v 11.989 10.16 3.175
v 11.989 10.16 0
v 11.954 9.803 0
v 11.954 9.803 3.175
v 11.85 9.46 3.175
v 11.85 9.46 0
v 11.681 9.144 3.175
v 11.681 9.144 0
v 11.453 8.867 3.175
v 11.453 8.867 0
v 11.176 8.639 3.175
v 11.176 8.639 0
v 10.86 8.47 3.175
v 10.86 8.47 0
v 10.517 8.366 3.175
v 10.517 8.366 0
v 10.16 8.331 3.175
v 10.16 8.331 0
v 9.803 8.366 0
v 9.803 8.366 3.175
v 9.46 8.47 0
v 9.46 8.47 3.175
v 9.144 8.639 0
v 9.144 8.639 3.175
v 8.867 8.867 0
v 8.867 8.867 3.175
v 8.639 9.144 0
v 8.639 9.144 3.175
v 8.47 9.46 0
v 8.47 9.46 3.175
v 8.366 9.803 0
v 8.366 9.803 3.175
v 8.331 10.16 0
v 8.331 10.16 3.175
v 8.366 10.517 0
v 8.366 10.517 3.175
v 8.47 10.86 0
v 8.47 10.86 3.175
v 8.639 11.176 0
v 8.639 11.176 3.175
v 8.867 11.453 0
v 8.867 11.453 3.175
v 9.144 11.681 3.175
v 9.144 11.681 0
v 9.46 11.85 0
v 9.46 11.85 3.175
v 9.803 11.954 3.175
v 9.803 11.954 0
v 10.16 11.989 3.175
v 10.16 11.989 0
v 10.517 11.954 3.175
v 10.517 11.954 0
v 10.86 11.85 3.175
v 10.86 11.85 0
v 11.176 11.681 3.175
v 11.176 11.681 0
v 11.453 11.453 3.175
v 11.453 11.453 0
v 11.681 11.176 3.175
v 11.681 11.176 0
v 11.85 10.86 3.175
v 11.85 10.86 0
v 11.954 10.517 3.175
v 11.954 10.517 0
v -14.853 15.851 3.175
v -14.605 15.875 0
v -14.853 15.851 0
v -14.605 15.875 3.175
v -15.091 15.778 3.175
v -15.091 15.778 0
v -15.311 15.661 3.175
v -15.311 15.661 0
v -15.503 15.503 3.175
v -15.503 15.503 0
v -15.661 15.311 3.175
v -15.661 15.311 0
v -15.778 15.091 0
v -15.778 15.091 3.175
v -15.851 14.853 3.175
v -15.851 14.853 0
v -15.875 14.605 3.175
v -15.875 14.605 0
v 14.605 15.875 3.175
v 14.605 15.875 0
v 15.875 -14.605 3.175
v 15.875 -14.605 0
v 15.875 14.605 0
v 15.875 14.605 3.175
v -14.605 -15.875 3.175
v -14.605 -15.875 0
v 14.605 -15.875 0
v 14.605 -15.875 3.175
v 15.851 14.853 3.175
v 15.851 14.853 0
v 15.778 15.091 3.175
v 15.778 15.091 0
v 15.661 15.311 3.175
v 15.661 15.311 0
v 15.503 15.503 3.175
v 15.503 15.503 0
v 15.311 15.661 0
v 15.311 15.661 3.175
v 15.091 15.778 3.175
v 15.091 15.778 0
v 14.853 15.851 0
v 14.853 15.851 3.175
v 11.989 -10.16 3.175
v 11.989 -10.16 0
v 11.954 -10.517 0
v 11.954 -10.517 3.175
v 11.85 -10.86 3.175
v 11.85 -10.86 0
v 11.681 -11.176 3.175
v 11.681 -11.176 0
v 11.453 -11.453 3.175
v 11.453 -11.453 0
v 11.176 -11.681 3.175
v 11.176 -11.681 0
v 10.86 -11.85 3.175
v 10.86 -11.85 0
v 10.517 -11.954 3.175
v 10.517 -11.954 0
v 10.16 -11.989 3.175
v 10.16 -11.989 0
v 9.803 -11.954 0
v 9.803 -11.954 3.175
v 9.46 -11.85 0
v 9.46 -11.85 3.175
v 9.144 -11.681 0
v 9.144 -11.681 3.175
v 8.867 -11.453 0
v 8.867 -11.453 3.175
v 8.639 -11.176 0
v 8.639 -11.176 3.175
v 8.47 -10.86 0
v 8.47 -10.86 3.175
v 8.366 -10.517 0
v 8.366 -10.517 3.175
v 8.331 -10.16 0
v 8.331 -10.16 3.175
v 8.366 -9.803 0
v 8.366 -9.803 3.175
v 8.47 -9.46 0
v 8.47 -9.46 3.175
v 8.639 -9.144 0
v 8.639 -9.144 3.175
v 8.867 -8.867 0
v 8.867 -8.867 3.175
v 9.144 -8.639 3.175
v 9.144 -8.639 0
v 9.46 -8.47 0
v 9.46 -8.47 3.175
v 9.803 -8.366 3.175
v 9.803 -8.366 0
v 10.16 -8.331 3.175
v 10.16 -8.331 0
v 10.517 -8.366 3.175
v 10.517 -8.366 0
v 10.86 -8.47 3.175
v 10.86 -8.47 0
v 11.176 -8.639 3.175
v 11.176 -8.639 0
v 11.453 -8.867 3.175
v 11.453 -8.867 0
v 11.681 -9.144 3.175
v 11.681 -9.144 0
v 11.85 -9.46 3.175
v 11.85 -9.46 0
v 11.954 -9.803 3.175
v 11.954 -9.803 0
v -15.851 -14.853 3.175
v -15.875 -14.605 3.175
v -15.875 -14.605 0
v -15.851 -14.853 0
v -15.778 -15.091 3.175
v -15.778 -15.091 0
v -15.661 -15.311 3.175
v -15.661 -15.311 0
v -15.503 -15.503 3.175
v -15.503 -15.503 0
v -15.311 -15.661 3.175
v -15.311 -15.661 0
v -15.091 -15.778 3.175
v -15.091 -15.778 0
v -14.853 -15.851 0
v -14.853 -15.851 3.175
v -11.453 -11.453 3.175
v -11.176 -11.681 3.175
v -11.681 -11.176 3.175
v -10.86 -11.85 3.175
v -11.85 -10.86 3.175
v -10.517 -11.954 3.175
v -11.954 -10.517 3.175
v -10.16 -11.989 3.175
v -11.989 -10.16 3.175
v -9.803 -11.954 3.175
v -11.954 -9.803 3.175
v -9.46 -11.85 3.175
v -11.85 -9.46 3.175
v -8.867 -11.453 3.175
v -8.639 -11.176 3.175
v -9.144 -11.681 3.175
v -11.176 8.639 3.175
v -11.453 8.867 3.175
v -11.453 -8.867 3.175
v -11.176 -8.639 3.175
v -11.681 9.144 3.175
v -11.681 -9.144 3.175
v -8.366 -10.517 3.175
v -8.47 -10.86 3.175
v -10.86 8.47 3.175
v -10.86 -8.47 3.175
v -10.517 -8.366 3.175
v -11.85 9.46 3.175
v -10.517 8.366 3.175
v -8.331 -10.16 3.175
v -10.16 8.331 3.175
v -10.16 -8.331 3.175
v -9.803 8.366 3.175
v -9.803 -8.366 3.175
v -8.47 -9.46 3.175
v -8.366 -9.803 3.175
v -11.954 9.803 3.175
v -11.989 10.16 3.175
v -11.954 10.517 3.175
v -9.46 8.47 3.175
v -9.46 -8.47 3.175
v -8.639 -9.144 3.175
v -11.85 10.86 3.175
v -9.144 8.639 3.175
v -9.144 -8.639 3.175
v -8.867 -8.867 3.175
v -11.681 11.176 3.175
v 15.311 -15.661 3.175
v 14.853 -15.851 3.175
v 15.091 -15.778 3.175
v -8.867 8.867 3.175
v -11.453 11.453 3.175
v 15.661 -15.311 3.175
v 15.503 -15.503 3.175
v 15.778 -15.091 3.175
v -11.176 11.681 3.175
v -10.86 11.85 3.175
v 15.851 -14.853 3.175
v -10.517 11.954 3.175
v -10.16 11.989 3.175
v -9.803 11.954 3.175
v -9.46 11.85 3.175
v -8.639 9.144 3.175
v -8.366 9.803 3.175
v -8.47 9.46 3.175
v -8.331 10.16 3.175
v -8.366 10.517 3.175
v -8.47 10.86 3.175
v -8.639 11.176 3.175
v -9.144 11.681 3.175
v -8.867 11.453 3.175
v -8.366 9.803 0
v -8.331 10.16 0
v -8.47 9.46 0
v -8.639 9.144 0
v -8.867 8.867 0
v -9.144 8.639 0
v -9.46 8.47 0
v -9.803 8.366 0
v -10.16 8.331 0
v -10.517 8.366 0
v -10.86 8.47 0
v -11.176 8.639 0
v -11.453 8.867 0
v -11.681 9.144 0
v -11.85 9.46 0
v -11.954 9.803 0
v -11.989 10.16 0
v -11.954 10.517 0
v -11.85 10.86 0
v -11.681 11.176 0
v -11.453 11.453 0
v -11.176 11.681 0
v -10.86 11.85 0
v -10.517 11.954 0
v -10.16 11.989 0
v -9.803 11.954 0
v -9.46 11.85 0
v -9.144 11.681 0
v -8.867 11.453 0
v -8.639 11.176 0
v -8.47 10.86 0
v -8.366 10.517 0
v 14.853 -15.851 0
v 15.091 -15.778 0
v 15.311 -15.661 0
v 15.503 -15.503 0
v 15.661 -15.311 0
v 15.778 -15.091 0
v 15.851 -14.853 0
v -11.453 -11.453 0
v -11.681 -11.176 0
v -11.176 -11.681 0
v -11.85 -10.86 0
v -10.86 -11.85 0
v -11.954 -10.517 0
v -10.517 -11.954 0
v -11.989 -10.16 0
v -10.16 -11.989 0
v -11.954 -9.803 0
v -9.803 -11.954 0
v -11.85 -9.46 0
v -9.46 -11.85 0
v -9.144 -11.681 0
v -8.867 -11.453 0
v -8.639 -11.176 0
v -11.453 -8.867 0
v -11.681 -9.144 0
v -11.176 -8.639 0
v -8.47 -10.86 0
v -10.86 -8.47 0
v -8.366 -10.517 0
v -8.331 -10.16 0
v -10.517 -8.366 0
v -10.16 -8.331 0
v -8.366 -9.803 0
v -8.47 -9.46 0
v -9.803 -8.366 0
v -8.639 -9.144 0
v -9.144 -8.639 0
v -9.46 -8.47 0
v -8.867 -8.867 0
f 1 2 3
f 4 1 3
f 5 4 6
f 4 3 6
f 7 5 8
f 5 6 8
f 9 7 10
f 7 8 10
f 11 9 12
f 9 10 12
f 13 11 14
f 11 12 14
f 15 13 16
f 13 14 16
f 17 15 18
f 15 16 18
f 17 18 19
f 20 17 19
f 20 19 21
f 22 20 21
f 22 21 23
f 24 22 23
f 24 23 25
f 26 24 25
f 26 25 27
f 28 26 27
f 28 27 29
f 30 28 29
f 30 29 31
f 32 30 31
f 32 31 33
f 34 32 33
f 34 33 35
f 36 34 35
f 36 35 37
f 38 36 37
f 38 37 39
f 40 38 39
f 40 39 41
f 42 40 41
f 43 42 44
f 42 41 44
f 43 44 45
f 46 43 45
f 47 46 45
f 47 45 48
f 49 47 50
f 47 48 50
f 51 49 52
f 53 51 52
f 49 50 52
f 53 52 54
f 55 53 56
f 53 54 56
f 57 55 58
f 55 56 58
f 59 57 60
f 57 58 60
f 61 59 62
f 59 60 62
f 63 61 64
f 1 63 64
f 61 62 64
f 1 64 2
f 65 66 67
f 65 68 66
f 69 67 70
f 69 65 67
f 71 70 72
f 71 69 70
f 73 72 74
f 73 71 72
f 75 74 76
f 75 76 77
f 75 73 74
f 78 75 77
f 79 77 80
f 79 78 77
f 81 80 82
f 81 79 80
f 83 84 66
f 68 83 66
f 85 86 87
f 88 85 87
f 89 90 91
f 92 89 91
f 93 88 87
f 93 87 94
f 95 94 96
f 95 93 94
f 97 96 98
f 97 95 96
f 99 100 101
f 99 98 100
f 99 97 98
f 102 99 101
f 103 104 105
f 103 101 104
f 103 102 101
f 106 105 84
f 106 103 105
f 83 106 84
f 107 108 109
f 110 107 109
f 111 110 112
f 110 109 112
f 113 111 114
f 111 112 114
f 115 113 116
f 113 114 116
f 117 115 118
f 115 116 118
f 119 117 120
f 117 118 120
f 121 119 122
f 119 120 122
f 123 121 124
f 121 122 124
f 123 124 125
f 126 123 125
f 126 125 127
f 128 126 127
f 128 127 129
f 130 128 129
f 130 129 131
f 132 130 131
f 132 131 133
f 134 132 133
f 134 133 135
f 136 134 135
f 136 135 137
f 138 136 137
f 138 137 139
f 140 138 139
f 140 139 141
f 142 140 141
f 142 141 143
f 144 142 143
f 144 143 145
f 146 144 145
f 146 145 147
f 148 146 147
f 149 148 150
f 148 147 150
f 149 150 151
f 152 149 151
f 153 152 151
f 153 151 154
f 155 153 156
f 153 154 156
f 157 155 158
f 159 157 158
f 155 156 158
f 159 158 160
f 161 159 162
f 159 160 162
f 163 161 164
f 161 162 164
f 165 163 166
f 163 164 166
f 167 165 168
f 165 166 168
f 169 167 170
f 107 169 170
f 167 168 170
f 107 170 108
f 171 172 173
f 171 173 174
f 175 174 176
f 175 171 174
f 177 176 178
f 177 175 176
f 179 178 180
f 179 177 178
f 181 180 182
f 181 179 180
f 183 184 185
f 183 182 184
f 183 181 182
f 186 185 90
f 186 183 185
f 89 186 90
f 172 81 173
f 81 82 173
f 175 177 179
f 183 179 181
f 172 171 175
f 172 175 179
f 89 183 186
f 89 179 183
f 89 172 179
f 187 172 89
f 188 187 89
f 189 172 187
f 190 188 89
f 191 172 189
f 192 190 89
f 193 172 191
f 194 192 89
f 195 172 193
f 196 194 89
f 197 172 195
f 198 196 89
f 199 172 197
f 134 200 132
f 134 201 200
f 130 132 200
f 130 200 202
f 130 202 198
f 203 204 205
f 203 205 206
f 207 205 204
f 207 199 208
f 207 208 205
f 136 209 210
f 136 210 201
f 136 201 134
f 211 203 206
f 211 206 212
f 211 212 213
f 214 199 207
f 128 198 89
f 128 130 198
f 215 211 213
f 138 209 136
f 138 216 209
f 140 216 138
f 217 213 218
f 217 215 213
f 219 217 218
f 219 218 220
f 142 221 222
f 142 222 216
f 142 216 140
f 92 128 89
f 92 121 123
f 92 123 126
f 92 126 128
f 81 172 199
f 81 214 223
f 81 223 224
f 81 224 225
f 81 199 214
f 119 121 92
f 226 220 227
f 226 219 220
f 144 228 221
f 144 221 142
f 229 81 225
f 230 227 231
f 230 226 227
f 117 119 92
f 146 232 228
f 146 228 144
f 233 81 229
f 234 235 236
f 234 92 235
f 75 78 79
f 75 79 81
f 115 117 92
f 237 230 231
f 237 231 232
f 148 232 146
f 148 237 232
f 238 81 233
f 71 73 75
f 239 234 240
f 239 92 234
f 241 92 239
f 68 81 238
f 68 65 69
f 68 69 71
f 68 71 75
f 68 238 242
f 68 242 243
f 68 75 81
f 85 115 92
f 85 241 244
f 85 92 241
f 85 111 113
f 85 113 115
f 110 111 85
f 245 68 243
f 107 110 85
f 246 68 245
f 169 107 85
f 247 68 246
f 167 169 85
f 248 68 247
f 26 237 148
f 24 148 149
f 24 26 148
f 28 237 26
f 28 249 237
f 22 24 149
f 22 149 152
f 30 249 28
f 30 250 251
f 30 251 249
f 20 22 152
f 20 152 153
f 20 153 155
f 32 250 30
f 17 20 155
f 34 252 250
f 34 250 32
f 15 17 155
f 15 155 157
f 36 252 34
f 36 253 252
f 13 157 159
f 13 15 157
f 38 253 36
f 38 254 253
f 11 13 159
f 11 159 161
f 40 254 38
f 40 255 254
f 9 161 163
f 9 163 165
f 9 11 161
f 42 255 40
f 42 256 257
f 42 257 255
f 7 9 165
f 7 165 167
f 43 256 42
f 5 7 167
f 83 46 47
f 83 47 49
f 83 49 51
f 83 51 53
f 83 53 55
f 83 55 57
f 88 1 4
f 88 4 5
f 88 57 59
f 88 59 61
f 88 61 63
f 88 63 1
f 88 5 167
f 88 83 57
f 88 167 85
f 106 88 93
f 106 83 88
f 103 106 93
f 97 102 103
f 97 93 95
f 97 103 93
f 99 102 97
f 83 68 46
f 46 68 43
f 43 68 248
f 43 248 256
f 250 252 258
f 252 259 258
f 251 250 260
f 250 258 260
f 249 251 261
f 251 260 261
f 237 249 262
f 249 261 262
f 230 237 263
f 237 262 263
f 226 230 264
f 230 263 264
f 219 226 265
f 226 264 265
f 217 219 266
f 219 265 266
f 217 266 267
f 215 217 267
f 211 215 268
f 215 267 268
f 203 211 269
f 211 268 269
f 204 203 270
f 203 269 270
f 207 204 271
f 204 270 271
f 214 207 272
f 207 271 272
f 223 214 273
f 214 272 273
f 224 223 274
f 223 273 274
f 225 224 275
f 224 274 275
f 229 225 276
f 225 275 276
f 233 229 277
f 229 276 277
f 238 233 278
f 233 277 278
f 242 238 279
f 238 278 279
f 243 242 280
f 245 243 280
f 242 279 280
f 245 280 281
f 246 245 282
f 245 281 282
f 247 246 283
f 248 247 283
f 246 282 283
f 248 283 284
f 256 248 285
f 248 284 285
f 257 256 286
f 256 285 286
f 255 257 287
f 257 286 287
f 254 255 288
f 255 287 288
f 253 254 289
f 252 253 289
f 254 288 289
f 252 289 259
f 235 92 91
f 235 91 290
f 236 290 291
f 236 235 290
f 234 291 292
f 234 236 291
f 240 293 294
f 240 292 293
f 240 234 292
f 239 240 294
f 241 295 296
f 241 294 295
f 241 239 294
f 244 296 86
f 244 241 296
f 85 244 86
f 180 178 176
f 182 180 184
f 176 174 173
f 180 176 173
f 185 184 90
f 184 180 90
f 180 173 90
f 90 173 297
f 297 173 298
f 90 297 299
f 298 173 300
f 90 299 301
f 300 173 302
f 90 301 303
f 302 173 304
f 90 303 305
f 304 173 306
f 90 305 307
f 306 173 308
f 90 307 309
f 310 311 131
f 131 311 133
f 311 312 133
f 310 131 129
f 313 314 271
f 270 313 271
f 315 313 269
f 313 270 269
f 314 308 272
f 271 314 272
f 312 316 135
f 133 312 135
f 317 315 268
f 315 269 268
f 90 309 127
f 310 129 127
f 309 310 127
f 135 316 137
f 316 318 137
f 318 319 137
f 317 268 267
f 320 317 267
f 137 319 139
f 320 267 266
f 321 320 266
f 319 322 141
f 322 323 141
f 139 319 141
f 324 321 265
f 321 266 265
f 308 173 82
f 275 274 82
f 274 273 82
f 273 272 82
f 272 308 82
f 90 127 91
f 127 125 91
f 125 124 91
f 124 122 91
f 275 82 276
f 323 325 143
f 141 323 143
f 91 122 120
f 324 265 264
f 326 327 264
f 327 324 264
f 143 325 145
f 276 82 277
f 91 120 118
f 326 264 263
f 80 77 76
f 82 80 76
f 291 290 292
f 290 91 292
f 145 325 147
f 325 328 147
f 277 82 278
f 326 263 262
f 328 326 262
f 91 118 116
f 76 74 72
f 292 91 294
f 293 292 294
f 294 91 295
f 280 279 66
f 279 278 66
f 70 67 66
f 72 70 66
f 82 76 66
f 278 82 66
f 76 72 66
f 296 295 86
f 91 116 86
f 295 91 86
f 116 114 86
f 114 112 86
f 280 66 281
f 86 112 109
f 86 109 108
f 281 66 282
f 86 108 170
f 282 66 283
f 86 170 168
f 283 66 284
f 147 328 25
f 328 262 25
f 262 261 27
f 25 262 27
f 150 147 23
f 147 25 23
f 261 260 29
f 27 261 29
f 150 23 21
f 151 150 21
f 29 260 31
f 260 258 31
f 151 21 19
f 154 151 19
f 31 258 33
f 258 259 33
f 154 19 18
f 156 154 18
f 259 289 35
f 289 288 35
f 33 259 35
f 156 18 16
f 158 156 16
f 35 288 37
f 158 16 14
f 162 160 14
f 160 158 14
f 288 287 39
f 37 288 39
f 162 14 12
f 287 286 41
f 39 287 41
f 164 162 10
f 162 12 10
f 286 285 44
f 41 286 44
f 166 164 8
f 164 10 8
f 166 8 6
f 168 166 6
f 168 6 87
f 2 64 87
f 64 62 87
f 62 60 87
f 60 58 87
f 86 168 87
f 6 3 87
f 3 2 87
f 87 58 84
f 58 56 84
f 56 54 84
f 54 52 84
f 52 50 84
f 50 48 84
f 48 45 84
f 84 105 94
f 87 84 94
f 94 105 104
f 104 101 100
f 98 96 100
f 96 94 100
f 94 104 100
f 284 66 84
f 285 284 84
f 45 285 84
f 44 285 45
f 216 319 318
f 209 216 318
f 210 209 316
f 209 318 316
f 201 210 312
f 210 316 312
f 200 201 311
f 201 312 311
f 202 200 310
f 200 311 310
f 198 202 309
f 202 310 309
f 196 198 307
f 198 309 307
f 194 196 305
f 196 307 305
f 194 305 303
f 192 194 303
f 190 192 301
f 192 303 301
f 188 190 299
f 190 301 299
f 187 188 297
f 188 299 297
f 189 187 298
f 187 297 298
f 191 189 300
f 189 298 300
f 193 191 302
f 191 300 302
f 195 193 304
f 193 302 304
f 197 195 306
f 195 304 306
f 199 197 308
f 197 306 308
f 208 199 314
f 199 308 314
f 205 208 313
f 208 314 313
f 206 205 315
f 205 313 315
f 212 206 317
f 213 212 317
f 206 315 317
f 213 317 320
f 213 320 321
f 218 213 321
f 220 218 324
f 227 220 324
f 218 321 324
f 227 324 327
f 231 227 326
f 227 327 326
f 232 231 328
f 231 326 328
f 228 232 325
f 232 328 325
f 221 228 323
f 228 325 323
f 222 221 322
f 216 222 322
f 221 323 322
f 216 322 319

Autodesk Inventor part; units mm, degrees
ref_plane "YZ Plane" through (0, 0, 0) normal (1, 0, 0) x (0, 1, 0)
ref_plane "XZ Plane" through (0, 0, 0) normal (0, 1, 0) x (-1, 0, 0)
ref_plane "XY Plane" through (0, 0, 0) normal (0, 0, 1) x (1, 0, 0)
sketch "Sketch1" plane through (0, 0, 0) normal (0, 0, 1) x (1, 0, 0)
  line L0 (-15.875, -15.875) -> (15.875, -15.875)
  line L1 (15.875, -15.875) -> (15.875, 15.875)
  line L2 (15.875, 15.875) -> (-15.875, 15.875)
  line L3 (-15.875, 15.875) -> (-15.875, -15.875)
  line L4 (0, 0) -> (0, 6.6196)
  line L5 (-8.6733, 0) -> (9.2317, 0)
  circle A0 centre (-10.16, 10.16) radius 1.8288
  circle A1 centre (10.16, 10.16) radius 1.8288
  circle A2 centre (10.16, -10.16) radius 1.8288
  circle A3 centre (-10.16, -10.16) radius 1.8288
  dimension "d3" = 31.75
  dimension "d4" = 31.75
  dimension "d27" = 20.32
  dimension "d28" = 10.16
  dimension "d29" = 3.6576
  dimension "d30" = 3.6576
  dimension "d31" = 3.6576
  dimension "d32" = 3.6576
  dimension "d35" = 20.32
  dimension "d36" = 10.16
  dimension "d37" = 10.16
extrude "Extrusion1" add sketch "Sketch1" along normal blind 3.175 contours L3 L2 L1 L0 | A0 | A1 | A2 | A3
fillet "Fillet1" radius 1.27 1 edges at (15.875, 15.875, 1.5875)
fillet "Fillet2" radius 1.27 1 edges at (-15.875, 15.875, 1.5875)
fillet "Fillet3" radius 1.27 1 edges at (15.875, -15.875, 1.5875)
fillet "Fillet4" radius 1.27 1 edges at (-15.875, -15.875, 1.5875)
extrude "Extrusion2" cut sketch "Sketch1" along normal through all contours A0 | A1 | A2 | A3
properties part number "MotorMountBottom"
